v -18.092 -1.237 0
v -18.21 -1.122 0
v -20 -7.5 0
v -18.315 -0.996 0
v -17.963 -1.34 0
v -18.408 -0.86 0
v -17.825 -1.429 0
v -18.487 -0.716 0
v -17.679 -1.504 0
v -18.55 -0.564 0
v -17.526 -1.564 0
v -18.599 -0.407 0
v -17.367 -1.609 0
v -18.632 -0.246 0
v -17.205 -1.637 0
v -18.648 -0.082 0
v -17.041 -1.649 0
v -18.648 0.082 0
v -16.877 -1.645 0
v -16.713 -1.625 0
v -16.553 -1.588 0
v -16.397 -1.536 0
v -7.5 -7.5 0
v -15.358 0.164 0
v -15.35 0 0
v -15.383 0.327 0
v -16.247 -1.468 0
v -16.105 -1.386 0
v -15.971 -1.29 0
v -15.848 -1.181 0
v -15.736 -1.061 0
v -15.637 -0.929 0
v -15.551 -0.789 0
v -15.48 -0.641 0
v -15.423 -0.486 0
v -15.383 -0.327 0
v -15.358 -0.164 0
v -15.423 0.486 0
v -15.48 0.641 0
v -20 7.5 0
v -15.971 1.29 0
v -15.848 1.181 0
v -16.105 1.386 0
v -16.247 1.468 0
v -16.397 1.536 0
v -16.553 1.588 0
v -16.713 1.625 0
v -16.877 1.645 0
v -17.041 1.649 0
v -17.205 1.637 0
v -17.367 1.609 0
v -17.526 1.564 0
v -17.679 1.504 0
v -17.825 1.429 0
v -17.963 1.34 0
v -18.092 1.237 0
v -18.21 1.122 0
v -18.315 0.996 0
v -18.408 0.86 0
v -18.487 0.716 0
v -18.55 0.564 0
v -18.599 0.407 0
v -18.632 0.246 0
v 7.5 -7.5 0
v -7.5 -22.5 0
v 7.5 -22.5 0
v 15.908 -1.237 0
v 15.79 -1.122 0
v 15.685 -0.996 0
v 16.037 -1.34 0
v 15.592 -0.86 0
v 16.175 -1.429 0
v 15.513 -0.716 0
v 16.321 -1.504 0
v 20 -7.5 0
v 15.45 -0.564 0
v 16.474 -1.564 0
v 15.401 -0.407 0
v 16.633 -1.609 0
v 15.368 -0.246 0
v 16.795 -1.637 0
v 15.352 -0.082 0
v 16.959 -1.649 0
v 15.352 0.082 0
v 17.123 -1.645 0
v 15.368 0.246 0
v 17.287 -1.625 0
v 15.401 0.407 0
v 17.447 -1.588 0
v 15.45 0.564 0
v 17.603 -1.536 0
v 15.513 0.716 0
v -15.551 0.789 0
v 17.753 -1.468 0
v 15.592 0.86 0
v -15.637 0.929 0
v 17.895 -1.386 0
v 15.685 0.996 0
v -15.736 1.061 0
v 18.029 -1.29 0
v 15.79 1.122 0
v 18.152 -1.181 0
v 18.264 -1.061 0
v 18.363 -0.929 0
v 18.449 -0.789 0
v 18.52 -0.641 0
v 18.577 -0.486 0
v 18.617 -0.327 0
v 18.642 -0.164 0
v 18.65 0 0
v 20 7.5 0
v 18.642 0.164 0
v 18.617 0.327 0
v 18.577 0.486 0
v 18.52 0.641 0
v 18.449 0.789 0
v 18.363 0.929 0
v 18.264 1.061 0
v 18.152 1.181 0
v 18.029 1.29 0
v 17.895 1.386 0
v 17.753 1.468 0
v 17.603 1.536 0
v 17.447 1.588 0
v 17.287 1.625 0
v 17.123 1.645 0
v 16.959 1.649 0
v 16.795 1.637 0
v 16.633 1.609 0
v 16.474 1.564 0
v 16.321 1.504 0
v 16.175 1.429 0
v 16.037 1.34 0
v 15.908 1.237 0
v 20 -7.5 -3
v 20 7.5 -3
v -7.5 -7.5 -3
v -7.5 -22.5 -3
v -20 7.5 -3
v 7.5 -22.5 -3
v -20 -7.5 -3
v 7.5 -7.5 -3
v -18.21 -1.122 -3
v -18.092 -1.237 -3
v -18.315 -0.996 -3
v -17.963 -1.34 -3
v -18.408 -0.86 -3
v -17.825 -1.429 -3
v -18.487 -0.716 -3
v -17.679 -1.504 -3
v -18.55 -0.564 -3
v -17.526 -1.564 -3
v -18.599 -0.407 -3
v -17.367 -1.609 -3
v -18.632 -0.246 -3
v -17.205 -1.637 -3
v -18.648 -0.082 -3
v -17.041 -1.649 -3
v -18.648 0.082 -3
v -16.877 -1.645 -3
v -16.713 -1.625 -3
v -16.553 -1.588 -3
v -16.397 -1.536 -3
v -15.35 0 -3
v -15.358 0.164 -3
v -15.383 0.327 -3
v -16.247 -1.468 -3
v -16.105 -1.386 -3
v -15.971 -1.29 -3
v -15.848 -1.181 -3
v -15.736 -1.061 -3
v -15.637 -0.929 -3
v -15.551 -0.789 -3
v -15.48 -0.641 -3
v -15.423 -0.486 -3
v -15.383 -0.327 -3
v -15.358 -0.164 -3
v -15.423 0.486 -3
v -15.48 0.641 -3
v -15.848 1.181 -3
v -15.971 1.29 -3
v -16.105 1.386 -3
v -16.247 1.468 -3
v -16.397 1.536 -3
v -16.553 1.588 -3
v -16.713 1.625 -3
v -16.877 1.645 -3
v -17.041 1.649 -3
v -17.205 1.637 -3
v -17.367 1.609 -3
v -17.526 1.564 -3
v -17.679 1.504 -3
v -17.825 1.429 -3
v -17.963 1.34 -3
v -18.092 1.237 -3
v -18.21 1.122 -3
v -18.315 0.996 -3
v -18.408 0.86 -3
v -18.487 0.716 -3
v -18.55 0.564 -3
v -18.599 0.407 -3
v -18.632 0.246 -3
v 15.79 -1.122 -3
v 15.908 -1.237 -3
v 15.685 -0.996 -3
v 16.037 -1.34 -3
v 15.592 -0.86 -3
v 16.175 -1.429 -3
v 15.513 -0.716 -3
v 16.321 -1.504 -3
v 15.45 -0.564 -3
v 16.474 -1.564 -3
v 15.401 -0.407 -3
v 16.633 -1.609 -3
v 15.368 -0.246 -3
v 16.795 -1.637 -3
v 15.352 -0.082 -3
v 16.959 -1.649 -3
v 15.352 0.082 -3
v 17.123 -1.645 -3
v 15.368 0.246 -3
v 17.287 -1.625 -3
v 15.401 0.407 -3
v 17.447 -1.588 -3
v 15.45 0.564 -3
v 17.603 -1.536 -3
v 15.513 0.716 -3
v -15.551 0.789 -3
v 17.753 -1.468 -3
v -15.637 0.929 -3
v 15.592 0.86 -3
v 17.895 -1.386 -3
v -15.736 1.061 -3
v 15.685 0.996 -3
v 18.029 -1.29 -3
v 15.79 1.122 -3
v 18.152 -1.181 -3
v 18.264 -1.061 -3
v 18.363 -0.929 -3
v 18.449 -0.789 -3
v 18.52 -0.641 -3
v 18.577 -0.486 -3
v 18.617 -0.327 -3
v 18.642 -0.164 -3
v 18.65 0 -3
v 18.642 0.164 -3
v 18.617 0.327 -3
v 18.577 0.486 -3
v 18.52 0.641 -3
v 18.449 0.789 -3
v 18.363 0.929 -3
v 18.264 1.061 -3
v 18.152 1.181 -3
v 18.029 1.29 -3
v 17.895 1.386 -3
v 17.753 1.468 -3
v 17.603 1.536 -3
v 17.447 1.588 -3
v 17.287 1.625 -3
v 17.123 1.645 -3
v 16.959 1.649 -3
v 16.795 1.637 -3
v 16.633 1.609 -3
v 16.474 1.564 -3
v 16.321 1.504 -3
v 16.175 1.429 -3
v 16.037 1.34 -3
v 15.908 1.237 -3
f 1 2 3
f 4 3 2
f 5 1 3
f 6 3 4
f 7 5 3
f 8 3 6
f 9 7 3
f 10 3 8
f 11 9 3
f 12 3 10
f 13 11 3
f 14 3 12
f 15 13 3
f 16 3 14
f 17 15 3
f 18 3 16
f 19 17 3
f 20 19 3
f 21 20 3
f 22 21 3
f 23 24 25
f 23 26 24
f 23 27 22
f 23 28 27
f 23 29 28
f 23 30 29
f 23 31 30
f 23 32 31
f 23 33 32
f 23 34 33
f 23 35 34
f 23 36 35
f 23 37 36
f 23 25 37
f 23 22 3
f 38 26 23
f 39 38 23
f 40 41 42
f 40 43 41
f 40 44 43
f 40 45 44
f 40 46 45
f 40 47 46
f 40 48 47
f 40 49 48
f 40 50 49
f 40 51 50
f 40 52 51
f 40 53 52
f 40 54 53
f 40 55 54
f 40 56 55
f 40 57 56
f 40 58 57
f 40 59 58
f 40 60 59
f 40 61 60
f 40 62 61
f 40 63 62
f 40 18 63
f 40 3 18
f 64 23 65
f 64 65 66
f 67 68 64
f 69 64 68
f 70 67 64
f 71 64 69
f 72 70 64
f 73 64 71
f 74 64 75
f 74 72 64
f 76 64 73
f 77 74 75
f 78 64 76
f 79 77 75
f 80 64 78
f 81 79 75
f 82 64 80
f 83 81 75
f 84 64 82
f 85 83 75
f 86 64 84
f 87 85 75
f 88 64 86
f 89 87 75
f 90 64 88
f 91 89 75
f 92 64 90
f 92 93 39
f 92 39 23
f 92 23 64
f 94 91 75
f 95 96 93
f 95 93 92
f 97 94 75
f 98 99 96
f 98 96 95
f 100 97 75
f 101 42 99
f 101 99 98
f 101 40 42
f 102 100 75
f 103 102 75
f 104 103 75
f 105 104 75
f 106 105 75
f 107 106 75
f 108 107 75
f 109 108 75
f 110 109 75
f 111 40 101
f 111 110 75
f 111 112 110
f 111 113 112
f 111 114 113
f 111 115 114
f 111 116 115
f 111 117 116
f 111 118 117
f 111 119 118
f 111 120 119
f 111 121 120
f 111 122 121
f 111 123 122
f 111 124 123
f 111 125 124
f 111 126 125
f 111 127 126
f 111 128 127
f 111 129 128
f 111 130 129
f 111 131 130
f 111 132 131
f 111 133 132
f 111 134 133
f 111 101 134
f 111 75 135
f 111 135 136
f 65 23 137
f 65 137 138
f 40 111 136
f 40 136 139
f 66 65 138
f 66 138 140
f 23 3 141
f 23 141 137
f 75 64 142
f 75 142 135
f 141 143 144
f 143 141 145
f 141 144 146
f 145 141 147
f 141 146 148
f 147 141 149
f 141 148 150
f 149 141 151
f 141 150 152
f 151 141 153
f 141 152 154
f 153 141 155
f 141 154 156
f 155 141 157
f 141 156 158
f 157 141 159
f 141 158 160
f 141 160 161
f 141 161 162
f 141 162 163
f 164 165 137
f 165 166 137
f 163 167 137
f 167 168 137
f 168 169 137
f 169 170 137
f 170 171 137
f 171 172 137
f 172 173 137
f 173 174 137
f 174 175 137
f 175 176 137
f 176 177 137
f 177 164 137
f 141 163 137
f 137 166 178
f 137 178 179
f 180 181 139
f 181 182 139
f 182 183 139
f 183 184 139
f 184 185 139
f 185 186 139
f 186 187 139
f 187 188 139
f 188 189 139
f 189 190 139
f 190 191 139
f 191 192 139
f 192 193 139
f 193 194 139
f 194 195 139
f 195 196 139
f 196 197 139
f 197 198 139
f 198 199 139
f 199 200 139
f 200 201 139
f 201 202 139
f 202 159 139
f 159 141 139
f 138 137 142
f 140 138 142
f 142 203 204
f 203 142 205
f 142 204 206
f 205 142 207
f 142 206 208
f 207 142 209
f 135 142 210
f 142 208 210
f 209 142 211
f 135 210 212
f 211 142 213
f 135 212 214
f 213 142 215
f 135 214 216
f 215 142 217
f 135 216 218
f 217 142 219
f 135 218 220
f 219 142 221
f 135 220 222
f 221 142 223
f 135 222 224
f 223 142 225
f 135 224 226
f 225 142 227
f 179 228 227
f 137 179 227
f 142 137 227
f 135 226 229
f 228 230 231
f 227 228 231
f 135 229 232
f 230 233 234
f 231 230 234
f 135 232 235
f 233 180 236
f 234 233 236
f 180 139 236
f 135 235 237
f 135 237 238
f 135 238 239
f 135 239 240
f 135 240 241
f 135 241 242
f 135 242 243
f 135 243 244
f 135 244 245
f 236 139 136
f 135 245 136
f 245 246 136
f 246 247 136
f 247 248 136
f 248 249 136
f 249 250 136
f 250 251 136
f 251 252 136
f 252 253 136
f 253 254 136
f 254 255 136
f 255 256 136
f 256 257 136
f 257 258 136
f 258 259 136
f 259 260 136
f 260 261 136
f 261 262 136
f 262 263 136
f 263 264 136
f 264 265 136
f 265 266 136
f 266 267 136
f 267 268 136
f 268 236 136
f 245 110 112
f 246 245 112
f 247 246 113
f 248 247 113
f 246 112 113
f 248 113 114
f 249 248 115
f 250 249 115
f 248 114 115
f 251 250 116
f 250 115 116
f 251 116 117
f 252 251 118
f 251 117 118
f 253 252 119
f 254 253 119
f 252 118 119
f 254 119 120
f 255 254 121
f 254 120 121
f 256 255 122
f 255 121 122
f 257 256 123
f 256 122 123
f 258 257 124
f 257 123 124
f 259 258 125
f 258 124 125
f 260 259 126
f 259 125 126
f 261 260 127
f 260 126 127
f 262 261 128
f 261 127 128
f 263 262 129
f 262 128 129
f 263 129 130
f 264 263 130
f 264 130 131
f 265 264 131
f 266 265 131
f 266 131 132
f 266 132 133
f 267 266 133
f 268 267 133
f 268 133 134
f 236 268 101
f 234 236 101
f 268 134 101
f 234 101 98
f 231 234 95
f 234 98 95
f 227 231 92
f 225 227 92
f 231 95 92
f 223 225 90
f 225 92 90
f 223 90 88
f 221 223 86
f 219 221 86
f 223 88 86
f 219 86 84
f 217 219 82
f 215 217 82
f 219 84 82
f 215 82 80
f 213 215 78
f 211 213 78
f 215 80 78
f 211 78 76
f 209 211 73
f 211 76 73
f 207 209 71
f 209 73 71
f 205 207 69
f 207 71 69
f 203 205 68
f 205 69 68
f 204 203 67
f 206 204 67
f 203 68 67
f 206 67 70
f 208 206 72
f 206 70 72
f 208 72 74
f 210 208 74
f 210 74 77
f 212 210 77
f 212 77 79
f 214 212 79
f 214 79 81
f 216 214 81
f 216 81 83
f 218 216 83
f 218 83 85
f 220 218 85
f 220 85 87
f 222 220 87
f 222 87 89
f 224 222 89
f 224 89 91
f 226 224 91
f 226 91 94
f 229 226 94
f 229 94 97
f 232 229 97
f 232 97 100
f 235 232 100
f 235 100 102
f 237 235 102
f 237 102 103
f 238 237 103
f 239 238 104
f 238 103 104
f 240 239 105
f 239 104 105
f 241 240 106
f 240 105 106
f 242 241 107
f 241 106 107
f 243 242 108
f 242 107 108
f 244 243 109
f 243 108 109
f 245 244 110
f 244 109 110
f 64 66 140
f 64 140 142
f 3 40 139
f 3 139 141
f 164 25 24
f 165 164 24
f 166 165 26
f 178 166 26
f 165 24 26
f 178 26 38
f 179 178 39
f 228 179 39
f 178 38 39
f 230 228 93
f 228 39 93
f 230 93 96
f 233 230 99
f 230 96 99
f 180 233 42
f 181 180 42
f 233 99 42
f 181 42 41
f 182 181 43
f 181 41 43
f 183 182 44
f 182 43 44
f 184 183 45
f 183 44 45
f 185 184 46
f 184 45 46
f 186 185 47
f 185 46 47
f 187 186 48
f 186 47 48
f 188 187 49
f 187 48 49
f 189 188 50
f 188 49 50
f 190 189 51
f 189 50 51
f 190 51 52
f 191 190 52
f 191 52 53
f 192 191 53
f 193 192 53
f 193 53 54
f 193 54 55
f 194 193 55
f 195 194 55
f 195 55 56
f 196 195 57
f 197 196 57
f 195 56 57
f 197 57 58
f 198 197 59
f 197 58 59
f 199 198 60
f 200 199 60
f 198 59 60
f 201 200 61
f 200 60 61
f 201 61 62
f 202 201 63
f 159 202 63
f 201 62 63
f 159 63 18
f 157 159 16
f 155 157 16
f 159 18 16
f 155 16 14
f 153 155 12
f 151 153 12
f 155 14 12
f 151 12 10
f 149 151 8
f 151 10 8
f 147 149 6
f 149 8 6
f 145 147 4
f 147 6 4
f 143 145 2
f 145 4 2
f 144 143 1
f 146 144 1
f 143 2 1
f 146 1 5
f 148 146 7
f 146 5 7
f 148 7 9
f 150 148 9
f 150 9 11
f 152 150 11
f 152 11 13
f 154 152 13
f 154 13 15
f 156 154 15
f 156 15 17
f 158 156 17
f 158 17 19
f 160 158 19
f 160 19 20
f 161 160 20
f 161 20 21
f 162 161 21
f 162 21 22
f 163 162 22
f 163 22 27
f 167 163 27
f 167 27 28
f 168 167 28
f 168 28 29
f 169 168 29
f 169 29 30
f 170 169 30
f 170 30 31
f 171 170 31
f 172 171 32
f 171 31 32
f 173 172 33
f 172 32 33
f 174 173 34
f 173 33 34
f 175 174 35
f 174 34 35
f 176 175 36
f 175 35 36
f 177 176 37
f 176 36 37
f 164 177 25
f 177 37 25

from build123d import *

# Parameters (mm, degrees)
ESQUISSE1_R        = 1.65
BOSS_EXTRU_1_DEPTH = 3


with BuildPart() as part:
    # Esquisse1 → Boss.-Extru.1 (new body)
    with BuildSketch(Plane.XY):
        Polygon((-7.5, -7.5), (-7.5, -22.5), (7.5, -22.5), (7.5, -7.5), (20, -7.5), (20, 7.5), (-20, 7.5), (-20, -7.5), align=None)
        with Locations((-17, 0)):
            Circle(ESQUISSE1_R, mode=Mode.SUBTRACT)
        with Locations((17, 0)):
            Circle(ESQUISSE1_R, mode=Mode.SUBTRACT)
    extrude(amount=-BOSS_EXTRU_1_DEPTH)


solid = part.part
